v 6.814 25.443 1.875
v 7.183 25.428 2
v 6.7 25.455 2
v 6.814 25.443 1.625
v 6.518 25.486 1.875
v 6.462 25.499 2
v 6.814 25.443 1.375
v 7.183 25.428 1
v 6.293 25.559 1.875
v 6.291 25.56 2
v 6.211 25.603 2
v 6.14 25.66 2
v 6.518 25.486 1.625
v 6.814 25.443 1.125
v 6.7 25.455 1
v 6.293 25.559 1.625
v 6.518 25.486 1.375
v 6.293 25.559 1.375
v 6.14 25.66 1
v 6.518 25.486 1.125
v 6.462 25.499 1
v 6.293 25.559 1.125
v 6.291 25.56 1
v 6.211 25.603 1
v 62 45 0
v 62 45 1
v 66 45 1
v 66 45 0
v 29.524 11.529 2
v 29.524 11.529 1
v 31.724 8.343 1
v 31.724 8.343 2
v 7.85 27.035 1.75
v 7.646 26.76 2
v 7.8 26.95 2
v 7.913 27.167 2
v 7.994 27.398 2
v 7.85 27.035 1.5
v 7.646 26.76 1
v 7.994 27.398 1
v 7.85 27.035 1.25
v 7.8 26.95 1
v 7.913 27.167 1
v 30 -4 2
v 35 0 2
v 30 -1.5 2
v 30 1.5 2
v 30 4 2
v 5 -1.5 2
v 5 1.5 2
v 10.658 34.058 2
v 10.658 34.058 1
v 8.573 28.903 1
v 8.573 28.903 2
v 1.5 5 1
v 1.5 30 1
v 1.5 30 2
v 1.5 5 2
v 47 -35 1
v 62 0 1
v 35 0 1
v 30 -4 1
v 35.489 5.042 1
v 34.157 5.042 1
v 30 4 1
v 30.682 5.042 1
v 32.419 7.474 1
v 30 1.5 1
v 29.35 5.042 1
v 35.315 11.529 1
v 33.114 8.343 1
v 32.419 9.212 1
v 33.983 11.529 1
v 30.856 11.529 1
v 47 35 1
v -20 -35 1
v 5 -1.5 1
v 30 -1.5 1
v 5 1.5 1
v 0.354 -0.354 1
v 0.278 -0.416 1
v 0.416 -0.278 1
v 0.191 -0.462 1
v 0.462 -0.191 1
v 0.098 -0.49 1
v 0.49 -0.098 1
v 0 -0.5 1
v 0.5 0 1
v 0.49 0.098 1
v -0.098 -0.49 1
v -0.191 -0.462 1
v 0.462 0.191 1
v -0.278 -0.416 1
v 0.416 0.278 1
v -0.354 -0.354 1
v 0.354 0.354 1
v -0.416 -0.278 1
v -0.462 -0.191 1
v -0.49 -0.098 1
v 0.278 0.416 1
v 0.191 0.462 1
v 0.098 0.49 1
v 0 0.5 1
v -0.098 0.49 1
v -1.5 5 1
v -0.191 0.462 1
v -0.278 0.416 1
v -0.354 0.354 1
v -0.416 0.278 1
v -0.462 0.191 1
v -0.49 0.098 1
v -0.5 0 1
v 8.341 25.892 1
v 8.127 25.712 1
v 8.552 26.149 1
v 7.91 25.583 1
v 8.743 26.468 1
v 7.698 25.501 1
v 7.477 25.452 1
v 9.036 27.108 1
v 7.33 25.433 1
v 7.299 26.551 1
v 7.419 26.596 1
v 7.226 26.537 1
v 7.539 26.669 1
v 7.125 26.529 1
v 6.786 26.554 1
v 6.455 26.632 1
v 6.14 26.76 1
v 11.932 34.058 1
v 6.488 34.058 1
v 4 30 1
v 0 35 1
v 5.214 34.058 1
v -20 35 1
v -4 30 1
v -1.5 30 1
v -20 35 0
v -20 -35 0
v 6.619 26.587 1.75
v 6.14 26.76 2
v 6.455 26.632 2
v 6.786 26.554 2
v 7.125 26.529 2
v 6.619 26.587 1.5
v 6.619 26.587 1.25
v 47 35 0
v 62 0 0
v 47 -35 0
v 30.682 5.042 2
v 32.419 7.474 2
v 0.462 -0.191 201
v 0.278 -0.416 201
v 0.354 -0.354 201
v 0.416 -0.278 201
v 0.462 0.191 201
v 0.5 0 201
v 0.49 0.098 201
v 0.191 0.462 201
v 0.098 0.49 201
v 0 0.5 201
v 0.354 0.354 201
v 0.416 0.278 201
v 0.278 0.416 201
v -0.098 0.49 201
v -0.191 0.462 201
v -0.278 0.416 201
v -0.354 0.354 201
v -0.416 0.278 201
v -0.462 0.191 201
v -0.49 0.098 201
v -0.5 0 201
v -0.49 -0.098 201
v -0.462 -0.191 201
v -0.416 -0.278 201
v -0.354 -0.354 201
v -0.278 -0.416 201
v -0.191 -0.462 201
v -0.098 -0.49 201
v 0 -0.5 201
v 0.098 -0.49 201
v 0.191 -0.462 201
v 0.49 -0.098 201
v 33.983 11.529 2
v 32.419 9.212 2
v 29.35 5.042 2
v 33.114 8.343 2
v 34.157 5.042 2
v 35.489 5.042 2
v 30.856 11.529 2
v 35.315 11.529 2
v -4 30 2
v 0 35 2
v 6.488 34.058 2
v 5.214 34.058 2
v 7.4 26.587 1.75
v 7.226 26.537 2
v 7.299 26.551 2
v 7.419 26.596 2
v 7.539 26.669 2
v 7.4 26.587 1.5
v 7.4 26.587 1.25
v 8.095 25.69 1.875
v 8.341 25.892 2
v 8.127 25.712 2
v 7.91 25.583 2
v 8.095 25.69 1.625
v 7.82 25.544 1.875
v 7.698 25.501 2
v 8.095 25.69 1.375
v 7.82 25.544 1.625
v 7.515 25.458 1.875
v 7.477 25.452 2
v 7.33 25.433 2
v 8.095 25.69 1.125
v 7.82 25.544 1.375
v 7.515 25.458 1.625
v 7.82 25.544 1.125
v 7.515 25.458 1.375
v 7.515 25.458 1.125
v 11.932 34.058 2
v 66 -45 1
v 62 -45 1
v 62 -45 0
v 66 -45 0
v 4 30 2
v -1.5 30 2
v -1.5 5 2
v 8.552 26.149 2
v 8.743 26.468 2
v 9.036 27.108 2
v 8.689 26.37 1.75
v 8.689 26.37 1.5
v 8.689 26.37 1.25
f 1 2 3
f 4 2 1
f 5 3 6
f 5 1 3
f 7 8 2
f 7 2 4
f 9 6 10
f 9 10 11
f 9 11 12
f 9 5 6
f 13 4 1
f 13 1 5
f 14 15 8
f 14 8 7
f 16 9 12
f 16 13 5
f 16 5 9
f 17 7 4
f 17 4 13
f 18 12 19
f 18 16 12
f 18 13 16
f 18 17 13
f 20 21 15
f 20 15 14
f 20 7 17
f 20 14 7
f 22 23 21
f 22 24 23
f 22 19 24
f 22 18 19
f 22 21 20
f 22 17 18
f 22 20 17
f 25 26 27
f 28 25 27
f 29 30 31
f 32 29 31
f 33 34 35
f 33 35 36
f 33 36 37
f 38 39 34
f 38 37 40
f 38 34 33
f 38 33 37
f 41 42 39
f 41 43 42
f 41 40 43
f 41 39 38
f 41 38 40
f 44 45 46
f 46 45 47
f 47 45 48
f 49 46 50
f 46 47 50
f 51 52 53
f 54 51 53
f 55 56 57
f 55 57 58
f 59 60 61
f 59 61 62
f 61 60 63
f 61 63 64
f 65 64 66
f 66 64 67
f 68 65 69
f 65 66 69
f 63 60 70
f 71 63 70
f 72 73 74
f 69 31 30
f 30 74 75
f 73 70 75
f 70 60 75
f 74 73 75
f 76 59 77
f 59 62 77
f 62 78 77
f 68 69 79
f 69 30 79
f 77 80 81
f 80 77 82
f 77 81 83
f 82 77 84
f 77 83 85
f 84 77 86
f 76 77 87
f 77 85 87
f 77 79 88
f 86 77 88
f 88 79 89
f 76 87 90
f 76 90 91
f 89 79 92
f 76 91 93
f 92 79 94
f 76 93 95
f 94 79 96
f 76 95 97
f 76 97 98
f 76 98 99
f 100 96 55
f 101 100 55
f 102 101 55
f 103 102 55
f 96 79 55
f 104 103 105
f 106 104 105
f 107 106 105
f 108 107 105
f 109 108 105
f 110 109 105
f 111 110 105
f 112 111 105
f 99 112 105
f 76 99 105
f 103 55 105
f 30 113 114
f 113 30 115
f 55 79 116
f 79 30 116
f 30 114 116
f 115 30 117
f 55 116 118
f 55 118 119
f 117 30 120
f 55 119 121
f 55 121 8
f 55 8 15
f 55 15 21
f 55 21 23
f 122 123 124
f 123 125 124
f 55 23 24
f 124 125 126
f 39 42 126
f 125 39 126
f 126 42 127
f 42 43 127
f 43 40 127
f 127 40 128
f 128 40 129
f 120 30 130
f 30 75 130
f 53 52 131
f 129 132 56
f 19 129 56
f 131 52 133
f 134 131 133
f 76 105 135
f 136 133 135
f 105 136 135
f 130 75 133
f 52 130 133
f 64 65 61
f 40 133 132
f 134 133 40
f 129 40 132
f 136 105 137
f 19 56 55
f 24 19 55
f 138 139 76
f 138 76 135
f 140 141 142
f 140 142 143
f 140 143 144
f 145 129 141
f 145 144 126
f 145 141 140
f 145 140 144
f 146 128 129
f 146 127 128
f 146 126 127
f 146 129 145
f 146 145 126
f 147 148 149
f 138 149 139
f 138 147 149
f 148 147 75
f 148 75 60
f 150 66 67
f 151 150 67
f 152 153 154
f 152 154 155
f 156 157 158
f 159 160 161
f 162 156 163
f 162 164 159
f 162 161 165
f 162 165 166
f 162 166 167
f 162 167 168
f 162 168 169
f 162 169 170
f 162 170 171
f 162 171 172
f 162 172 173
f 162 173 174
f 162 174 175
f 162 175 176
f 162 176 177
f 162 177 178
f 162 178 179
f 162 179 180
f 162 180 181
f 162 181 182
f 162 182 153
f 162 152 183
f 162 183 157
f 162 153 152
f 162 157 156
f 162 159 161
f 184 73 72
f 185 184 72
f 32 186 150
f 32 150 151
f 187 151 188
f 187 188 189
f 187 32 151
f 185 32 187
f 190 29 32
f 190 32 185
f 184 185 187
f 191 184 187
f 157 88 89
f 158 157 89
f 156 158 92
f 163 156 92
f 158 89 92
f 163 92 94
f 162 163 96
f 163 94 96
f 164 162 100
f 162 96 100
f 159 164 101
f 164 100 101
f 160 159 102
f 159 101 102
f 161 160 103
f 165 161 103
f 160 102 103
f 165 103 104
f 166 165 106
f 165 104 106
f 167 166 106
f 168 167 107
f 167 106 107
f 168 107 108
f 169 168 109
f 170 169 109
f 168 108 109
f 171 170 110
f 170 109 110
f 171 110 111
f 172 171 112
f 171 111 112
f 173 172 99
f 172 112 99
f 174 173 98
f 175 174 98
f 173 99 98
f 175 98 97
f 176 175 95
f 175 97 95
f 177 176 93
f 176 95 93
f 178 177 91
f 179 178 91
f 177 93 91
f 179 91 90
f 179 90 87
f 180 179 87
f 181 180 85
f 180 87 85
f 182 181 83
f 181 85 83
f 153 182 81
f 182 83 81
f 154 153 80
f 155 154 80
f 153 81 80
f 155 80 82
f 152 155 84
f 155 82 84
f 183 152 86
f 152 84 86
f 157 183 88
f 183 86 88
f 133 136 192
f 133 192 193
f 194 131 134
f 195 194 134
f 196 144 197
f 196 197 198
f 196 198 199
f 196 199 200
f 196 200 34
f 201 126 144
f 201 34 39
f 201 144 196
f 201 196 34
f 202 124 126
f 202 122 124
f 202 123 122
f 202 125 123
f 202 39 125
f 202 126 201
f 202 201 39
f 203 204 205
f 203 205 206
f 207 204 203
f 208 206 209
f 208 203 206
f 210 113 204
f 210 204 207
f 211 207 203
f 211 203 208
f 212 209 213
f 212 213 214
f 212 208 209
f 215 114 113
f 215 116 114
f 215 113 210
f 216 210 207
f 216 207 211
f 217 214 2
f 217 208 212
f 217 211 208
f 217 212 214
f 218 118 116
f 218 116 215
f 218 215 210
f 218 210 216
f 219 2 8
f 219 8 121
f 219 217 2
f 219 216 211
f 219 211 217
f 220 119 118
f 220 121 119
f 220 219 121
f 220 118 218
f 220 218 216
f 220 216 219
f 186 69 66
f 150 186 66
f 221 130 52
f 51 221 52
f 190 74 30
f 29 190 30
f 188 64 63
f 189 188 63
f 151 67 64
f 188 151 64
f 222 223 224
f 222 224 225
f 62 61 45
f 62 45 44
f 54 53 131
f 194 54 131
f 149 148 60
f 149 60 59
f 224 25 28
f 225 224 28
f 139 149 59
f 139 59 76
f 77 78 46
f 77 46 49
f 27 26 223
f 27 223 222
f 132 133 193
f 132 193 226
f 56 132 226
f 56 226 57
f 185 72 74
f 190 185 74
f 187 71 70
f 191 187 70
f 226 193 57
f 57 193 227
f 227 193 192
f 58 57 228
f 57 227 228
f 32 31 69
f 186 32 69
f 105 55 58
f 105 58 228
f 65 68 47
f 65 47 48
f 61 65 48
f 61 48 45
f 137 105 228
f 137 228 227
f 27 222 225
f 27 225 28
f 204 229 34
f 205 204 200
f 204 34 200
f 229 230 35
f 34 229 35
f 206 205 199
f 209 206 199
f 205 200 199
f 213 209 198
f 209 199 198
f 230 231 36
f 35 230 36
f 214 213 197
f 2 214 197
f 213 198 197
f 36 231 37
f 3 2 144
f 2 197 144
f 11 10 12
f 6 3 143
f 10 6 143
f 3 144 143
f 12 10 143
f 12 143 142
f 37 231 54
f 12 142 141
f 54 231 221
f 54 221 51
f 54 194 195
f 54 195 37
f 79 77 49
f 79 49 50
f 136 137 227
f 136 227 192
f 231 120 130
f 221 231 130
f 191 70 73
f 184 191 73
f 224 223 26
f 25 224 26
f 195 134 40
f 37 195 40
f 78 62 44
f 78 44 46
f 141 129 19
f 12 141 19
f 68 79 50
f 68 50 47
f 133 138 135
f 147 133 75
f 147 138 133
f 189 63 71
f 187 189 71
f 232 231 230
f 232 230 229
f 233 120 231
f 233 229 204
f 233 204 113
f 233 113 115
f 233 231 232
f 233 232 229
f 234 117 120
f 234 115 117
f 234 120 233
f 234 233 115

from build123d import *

# Parameters (mm, degrees)
EXTRUDE_1_DEPTH          = 1
SKETCH_2_R               = 0.5
EXTRUDE_2_DEPTH          = 200
EXTRUDE_3_DEPTH          = 1
PATTERN_CIRCULAR_1_COUNT = 2
PATTERN_CIRCULAR_1_ANGLE = 90
SKETCH_4_W               = 4
SKETCH_4_H               = 90
EXTRUDE_4_DEPTH          = 1
EXTRUDE_START            = 1
EXTRUDE_5_DEPTH          = 1


# Read off the part's stored shape, not the designer's step: 押し出し5
with BuildPart() as part:
    # ｽｹｯﾁ1 → 押し出し1 (new body)
    with BuildSketch(Plane.XY):
        Polygon((-20, -35), (-20, 35), (47, 35), (62, 0), (47, -35), align=None)
    extrude(amount=EXTRUDE_1_DEPTH)

    # ｽｹｯﾁ2 → 押し出し2 (add)
    with BuildSketch(Plane.XY.offset(1)):
        Circle(SKETCH_2_R)
    extrude(amount=EXTRUDE_2_DEPTH)

    # ｽｹｯﾁ3 → 押し出し3 (add)
    with BuildSketch(Plane.XY.offset(1)):
        Polygon((5, 1.5), (30, 1.5), (30, 4), (35, 0), (30, -4), (30, -1.5), (5, -1.5), align=None)
    extrude_3 = extrude(amount=EXTRUDE_3_DEPTH)

    # 円形ﾊﾟﾀｰﾝ1: 押し出し3 ×2 about axis
    pattern_circular_1_axis = Axis((0, 0, 0), (0, 0, 1))
    for i in range(1, PATTERN_CIRCULAR_1_COUNT):
        add(extrude_3.rotate(pattern_circular_1_axis, i * PATTERN_CIRCULAR_1_ANGLE / (PATTERN_CIRCULAR_1_COUNT - 1)))

    # 押し出し5 outline → 押し出し5 (add)
    with BuildSketch(Plane.XY.offset(EXTRUDE_START)):
        with BuildLine():
            add(Edge.make_bspline(
                [(7.646287037, 26.760441027), (7.684095406, 26.801569572), (7.761577676, 26.885856016), (7.855531929, 27.037278743), (7.934893033, 27.208972806), (7.973738313, 27.333346265), (7.993777384, 27.397506664)],
                knots=[0, 0, 0, 0, 0.22810973, 0.467474788, 0.725286809, 1, 1, 1, 1], degree=3))
            add(Edge.make_bspline(
                [(7.125051515, 26.528780796), (7.172584701, 26.531731962), (7.266774333, 26.537579862), (7.403597881, 26.583175986), (7.532315033, 26.657479619), (7.60740756, 26.725317615), (7.646287037, 26.760441027)],
                knots=[0, 0, 0, 0, 0.243362731, 0.482236686, 0.731925831, 1, 1, 1, 1], degree=3))
            add(Edge.make_bspline(
                [(6.140495531, 26.760441027), (6.218421027, 26.724977416), (6.373219293, 26.654529285), (6.617526792, 26.582085472), (6.868880788, 26.53765901), (7.039066964, 26.531760798), (7.125051515, 26.528780796)],
                knots=[0, 0, 0, 0, 0.251546113, 0.499693995, 0.747226312, 1, 1, 1, 1], degree=3))
            Line((6.140495531, 26.760441027), (6.140495531, 25.660054927))
            add(Edge.make_bspline(
                [(7.182966573, 25.428394695), (7.118594105, 25.429270849), (6.995476736, 25.430946562), (6.819487787, 25.442051989), (6.661523317, 25.457230921), (6.522149821, 25.484324643), (6.399828508, 25.514176487), (6.296115706, 25.555959151), (6.208298793, 25.60105168), (6.162045708, 25.641301694), (6.140495531, 25.660054927)],
                knots=[0, 0, 0, 0, 0.1772926, 0.339085928, 0.485673036, 0.613913128, 0.729992701, 0.831661923, 0.921568145, 1, 1, 1, 1], degree=3))
            add(Edge.make_bspline(
                [(8.341267732, 25.891715158), (8.302121003, 25.854169248), (8.225241681, 25.780433735), (8.095389821, 25.689271494), (7.963691437, 25.605006111), (7.820239111, 25.542623748), (7.671969703, 25.48846247), (7.514142965, 25.457310676), (7.351171612, 25.430508848), (7.239575543, 25.429106208), (7.182966573, 25.428394695)],
                knots=[0, 0, 0, 0, 0.126744603, 0.248910688, 0.370594491, 0.491909555, 0.614155835, 0.739210138, 0.867709987, 1, 1, 1, 1], degree=3))
            add(Edge.make_bspline(
                [(9.036248427, 27.107931375), (8.980283218, 26.973306878), (8.875802115, 26.721977235), (8.701494643, 26.384557747), (8.532933914, 26.106460729), (8.401177698, 25.958839153), (8.341267732, 25.891715158)],
                knots=[0, 0, 0, 0, 0.310327167, 0.579347877, 0.808728157, 1, 1, 1, 1], degree=3))
            Line((9.036248427, 27.107931375), (11.932001322, 34.057738324))
            Line((11.932001322, 34.057738324), (10.657870048, 34.057738324))
            Line((10.657870048, 34.057738324), (8.572927963, 28.90329817))
            Line((8.572927963, 28.90329817), (6.487985878, 34.057738324))
            Line((6.487985878, 34.057738324), (5.213854604, 34.057738324))
            Line((5.213854604, 34.057738324), (7.993777384, 27.397506664))
        make_face()
        Polygon((30.855734024, 11.52851209), (29.523687692, 11.52851209), (31.724459892, 8.343183904), (29.349942518, 5.042025603), (30.68198885, 5.042025603), (32.419440587, 7.474458036), (34.156892325, 5.042025603), (35.488938657, 5.042025603), (33.114421282, 8.343183904), (35.315193483, 11.52851209), (33.983147151, 11.52851209), (32.419440587, 9.211909773), align=None)
    extrude(amount=EXTRUDE_5_DEPTH)


with BuildPart() as body_2:
    # ｽｹｯﾁ4 → 押し出し4 (new body)
    with BuildSketch(Plane.XY.offset(1)):
        with Locations((64, 0)):
            Rectangle(SKETCH_4_W, SKETCH_4_H)
    extrude(amount=-EXTRUDE_4_DEPTH)


solid = Compound([part.part, body_2.part])
